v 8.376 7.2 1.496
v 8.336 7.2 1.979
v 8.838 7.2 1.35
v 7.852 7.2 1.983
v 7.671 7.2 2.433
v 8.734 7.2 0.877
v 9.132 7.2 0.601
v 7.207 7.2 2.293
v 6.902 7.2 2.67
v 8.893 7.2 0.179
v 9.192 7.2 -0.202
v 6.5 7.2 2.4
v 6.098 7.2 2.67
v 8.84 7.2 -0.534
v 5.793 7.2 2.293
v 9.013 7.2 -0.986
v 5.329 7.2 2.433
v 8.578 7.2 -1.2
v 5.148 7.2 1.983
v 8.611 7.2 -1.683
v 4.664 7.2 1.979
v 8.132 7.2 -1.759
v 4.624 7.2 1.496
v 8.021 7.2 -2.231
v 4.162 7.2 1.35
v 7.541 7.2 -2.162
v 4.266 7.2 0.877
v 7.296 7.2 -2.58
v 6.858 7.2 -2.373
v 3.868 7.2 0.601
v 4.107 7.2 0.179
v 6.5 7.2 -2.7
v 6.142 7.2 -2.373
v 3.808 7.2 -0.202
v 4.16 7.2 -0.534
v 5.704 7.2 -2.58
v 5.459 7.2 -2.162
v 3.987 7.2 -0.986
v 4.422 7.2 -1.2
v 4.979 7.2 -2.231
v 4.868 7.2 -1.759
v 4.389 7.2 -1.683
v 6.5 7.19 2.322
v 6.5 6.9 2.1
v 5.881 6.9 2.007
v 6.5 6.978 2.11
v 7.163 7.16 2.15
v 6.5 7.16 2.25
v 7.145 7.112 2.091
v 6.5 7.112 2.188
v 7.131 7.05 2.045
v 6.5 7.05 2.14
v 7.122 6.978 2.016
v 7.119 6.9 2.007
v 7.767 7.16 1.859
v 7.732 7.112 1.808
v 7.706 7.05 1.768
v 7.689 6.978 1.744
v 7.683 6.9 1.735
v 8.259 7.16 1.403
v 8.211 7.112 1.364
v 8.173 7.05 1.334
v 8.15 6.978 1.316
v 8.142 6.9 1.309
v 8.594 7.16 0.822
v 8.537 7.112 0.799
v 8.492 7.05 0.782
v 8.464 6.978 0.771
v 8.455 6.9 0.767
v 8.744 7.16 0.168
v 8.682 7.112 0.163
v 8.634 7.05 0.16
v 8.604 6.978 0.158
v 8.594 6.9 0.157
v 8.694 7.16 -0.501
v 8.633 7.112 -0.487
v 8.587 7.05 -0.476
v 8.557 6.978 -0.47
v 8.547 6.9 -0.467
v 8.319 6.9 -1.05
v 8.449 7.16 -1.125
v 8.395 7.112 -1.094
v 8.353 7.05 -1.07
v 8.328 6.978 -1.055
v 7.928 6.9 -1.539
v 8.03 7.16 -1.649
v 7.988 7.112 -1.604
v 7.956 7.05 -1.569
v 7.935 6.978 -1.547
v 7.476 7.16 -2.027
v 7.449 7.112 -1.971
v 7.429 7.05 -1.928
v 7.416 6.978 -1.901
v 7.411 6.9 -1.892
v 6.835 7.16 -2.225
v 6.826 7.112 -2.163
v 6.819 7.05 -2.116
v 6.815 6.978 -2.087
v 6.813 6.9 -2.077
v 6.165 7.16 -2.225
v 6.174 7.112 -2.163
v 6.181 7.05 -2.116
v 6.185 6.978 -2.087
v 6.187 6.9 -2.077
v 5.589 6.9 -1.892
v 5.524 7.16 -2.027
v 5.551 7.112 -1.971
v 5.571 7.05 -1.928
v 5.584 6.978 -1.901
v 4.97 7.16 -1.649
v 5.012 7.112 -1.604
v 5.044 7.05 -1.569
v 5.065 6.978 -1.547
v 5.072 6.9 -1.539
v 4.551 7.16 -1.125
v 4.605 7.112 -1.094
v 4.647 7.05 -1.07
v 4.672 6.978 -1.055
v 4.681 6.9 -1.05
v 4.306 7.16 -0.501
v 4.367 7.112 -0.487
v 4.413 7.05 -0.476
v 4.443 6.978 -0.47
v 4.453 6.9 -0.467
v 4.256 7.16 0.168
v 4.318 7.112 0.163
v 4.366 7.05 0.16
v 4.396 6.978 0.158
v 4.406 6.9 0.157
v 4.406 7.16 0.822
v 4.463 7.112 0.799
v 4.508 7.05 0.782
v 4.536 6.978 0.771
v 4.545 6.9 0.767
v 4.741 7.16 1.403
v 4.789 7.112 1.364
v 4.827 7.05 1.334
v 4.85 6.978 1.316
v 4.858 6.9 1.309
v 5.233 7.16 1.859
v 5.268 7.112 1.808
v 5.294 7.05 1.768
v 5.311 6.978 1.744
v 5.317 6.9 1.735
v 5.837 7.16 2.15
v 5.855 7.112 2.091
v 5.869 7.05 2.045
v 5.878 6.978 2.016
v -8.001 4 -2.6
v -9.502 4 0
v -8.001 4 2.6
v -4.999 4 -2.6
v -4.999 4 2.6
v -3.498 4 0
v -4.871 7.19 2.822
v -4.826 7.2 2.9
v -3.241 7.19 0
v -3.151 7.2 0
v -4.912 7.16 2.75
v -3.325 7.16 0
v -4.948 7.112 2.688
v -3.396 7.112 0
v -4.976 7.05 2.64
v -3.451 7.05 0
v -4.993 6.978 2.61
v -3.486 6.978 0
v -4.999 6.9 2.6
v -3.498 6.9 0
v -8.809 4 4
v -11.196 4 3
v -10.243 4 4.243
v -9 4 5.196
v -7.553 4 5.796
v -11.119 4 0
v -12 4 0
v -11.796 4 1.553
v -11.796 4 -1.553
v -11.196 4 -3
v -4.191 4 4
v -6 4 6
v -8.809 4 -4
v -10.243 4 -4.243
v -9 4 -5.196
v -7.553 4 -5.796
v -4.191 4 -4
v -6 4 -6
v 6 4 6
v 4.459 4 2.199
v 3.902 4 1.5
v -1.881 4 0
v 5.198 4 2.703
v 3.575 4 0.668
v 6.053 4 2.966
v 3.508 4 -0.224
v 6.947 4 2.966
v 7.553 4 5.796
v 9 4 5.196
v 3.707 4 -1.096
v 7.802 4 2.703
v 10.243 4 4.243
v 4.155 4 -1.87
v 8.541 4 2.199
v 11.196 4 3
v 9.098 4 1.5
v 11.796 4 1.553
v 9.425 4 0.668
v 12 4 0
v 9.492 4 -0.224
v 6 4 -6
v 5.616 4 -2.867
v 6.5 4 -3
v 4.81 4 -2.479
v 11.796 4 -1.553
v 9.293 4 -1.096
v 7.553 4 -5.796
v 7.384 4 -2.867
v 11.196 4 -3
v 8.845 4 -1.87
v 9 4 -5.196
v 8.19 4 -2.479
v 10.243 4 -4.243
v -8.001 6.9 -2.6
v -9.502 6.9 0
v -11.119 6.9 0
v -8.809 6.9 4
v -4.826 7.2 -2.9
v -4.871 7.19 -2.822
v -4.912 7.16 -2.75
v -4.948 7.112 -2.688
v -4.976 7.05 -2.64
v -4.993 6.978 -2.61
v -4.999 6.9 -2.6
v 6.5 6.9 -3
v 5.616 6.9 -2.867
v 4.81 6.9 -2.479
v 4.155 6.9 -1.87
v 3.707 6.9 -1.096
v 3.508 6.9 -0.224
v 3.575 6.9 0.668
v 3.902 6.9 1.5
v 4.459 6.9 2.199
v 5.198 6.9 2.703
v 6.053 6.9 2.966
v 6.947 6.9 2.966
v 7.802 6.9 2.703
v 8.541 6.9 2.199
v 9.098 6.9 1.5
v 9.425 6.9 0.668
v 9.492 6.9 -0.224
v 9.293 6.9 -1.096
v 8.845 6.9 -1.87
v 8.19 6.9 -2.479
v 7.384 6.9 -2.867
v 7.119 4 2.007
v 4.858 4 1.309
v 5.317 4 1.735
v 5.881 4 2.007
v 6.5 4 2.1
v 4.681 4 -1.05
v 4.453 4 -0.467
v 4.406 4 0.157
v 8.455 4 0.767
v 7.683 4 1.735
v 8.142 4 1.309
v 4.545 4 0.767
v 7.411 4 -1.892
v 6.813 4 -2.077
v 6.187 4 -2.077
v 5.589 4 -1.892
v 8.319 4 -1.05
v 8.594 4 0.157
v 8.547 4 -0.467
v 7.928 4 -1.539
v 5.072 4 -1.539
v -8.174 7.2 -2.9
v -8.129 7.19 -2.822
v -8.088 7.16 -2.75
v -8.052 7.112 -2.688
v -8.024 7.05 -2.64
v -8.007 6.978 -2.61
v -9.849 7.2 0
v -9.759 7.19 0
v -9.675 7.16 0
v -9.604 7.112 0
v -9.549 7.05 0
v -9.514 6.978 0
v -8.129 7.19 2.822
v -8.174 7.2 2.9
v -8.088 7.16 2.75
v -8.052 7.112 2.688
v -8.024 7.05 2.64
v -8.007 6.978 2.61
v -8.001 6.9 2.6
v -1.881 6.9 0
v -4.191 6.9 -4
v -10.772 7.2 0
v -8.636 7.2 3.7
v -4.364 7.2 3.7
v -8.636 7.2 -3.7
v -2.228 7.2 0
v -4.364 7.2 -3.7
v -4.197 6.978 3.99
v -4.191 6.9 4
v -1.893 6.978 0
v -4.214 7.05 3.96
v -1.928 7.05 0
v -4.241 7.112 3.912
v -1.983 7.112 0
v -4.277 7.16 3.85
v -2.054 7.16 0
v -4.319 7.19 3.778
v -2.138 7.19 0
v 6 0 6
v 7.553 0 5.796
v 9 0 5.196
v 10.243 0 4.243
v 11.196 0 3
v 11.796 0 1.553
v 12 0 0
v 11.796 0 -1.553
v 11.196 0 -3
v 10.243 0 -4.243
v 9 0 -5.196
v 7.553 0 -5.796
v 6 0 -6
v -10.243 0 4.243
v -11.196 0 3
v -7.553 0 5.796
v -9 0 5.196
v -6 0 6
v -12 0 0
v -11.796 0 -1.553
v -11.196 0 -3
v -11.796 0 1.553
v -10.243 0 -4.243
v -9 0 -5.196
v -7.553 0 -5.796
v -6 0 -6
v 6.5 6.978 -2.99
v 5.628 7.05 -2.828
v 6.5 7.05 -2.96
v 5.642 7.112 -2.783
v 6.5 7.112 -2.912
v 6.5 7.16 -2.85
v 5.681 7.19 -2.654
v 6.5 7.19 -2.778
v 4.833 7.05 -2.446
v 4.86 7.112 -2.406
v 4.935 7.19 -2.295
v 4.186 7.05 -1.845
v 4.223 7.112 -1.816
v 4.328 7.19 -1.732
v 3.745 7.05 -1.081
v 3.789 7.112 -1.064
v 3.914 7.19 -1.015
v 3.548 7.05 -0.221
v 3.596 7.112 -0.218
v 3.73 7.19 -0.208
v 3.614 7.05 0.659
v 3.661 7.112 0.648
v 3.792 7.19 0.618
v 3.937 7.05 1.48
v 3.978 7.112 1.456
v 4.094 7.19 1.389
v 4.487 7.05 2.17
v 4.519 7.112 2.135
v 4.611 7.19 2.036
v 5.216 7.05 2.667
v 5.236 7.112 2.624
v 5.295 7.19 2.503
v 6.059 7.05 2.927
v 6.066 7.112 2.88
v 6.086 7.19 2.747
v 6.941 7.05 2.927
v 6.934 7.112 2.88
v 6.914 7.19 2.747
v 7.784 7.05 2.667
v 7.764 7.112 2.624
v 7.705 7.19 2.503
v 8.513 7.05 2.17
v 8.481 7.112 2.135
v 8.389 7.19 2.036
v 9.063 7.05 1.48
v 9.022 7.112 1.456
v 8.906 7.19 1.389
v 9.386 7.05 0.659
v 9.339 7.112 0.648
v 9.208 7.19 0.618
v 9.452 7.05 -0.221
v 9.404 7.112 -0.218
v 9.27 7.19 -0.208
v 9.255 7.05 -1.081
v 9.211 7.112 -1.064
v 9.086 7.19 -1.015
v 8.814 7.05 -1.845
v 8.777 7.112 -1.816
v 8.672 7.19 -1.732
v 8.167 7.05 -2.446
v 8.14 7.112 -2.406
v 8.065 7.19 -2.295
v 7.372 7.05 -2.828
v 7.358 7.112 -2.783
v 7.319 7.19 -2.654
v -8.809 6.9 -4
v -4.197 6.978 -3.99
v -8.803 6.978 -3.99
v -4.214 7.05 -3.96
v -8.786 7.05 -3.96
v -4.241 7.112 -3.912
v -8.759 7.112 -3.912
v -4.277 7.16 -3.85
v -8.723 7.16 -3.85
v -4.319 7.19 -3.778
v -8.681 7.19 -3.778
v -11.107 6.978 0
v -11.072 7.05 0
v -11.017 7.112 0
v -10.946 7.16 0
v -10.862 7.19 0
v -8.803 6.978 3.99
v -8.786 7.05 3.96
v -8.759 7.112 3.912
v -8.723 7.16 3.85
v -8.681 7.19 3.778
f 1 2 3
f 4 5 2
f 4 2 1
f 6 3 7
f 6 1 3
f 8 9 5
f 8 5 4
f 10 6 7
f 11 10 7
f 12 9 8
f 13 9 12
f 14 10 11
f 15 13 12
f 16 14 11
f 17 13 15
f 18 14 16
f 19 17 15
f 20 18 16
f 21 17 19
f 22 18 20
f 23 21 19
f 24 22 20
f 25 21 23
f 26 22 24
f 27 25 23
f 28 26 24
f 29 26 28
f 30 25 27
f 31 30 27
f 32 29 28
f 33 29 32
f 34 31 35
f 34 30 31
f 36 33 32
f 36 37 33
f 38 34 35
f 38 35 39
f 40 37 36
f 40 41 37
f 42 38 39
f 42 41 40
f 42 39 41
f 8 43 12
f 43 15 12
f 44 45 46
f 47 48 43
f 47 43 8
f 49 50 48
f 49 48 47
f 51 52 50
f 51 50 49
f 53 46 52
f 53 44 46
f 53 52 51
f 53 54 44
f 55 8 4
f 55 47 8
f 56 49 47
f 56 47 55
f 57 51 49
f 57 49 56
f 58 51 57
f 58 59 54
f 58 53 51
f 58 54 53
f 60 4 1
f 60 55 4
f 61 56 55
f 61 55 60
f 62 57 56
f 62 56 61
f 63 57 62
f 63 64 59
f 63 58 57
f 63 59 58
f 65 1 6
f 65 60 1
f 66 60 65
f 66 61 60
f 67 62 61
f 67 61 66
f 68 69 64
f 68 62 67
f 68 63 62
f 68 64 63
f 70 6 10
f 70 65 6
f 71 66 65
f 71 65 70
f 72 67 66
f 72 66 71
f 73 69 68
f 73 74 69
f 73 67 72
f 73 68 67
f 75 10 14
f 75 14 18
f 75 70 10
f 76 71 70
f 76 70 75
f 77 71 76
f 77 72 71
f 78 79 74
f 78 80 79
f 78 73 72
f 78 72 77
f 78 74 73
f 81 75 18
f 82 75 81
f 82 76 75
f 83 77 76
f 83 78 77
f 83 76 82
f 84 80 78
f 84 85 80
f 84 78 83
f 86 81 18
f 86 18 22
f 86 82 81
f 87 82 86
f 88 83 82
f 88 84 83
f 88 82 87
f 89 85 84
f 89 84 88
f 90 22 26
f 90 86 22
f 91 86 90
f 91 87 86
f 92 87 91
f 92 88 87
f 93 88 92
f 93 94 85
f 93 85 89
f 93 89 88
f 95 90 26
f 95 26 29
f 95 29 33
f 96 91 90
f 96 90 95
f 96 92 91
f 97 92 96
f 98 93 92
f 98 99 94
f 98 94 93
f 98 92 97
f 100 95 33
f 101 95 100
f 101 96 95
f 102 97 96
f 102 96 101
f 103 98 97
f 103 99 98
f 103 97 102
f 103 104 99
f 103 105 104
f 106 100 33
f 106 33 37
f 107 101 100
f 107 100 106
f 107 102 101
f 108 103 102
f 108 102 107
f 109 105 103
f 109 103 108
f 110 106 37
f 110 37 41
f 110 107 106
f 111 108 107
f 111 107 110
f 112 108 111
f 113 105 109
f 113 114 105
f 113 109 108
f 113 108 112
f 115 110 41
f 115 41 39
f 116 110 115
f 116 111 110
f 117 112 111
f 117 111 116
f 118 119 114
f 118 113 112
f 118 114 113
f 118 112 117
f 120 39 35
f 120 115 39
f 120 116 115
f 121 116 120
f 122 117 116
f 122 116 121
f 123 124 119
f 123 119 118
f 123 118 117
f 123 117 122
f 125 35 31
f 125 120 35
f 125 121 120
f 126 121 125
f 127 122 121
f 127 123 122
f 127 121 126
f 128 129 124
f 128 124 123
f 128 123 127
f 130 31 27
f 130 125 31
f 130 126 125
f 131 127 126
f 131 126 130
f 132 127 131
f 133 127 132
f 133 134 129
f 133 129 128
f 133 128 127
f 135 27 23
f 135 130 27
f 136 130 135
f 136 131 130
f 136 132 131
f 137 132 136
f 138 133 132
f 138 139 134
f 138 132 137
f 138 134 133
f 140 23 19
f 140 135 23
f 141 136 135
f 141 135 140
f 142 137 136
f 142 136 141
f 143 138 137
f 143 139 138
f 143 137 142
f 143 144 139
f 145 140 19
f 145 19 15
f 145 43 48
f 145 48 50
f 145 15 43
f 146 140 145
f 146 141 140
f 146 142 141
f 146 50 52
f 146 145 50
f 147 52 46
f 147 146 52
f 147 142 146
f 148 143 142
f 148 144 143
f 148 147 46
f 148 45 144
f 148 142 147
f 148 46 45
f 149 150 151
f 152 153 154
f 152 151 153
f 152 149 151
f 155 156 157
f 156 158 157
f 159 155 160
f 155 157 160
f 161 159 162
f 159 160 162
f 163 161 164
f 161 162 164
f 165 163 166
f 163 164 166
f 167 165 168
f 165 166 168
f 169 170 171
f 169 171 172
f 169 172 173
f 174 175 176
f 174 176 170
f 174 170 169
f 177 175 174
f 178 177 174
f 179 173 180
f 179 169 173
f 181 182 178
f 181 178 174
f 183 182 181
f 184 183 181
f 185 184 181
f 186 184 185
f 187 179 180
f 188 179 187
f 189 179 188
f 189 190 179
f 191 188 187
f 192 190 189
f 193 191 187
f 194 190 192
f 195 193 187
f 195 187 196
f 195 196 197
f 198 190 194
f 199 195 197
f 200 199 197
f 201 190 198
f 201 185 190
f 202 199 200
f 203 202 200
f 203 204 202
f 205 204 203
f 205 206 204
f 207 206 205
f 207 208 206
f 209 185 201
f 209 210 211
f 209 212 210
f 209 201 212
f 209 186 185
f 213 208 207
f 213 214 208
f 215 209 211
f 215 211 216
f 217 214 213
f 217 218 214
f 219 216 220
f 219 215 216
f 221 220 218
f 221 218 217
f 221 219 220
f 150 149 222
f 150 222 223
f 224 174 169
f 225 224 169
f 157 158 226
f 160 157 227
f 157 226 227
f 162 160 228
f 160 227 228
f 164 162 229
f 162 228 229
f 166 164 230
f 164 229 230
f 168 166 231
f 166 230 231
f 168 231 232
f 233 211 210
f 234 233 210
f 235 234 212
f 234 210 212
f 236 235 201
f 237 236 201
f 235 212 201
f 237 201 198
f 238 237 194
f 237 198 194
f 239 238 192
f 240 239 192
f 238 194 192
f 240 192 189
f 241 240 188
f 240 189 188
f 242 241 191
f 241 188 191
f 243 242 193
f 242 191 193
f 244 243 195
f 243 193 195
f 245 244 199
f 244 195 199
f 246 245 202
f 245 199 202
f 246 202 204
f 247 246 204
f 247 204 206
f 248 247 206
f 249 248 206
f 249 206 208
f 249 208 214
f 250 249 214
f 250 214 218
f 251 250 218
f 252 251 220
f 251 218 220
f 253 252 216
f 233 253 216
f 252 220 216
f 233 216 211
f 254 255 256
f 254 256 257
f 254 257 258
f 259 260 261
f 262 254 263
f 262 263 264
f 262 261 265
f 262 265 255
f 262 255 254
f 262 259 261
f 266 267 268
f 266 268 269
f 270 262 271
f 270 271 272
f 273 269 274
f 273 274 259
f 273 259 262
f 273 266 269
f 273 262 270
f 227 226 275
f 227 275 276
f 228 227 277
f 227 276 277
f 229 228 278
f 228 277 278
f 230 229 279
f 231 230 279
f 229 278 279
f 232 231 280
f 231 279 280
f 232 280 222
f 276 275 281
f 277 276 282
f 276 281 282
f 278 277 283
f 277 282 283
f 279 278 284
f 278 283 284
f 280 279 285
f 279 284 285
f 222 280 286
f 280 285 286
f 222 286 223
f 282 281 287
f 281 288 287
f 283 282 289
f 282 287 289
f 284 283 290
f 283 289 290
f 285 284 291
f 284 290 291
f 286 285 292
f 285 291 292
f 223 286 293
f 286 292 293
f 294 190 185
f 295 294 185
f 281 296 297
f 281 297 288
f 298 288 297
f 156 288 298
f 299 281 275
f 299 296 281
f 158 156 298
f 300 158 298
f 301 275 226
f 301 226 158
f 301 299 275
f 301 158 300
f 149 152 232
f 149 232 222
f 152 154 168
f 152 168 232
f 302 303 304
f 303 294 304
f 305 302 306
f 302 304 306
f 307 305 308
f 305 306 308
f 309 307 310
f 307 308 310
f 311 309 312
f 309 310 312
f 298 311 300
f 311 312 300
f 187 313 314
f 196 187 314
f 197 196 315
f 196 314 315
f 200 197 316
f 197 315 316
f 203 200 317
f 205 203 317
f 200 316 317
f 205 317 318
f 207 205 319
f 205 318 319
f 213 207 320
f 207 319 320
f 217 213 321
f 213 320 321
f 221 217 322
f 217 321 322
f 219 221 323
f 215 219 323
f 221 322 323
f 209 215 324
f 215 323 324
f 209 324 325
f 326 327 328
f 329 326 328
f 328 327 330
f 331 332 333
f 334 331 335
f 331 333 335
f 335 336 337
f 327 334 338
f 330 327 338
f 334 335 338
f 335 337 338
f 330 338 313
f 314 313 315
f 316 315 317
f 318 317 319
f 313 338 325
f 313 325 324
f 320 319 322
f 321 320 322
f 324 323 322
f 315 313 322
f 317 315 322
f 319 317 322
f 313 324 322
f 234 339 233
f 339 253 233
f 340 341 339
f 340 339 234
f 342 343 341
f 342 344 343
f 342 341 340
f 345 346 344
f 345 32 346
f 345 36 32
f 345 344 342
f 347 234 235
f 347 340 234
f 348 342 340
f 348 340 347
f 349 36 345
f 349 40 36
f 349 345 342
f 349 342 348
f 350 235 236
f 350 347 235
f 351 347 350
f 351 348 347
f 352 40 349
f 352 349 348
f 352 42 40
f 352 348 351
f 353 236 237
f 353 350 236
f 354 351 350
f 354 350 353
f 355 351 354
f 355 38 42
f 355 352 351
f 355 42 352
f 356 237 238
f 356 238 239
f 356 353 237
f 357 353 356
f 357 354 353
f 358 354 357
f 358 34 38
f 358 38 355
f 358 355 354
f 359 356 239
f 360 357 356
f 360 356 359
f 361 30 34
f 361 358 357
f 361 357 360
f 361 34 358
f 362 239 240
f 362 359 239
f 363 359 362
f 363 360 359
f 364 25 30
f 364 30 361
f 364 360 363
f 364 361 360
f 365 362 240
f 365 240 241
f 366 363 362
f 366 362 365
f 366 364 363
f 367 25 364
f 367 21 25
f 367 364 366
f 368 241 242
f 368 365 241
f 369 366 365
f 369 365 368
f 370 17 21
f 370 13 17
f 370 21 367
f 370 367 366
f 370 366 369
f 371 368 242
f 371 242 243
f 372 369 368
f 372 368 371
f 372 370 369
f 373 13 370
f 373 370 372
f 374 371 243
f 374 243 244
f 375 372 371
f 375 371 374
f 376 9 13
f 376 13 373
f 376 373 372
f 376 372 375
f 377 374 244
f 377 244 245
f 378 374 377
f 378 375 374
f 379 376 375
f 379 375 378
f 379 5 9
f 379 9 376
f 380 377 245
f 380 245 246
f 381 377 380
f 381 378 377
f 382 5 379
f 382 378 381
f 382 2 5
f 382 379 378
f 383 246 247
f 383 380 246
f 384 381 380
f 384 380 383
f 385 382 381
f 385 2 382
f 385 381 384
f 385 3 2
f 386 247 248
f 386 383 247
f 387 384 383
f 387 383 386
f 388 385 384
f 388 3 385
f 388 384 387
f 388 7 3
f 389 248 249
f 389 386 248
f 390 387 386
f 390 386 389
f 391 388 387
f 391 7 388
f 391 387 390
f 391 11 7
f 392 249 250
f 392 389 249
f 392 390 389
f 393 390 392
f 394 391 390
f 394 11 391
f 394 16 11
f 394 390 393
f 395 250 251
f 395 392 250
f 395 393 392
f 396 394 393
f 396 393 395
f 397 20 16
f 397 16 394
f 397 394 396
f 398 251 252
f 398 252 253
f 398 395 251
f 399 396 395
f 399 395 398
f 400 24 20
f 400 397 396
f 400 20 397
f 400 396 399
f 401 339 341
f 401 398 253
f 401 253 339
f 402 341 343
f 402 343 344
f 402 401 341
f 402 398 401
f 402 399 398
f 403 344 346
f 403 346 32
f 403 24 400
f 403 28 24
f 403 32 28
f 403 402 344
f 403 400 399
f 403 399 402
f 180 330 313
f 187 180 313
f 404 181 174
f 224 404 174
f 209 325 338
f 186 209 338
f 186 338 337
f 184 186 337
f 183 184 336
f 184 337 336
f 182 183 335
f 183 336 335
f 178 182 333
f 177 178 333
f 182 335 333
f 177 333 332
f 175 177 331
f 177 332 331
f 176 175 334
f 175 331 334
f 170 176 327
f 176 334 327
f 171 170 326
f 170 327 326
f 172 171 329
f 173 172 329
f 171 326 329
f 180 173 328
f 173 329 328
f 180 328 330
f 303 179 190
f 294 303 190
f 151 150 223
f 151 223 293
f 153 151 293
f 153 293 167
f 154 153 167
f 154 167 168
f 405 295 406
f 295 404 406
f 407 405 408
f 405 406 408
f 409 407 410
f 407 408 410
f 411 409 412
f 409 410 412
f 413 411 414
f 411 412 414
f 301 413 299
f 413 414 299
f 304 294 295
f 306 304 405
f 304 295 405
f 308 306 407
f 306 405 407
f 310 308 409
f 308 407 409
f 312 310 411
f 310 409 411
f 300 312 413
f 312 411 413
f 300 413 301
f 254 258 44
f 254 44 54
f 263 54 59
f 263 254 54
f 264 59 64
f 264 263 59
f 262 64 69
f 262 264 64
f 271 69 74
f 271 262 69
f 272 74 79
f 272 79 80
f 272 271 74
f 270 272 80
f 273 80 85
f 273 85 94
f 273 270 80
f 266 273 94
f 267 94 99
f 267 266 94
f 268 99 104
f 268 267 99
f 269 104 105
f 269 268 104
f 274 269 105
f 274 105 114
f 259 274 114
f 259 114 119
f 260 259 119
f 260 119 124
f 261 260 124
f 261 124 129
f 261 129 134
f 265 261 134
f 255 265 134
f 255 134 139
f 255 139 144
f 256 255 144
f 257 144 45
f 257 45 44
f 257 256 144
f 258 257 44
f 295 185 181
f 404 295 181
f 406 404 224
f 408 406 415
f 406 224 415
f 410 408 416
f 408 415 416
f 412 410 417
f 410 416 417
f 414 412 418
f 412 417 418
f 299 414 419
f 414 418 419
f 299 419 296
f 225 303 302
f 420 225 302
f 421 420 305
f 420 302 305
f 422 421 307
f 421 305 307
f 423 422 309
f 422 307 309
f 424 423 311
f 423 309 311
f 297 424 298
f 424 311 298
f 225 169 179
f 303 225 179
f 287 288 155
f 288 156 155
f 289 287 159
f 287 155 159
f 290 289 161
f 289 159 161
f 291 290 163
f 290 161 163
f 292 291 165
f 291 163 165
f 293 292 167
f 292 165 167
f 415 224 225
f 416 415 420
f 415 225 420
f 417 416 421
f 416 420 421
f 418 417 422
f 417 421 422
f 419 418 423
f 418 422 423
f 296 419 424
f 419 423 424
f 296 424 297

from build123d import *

# Parameters (mm, degrees)
EXTRUDE_1_DEPTH = 4
SKETCH_2_R      = 3
SKETCH_2_R_2    = 2.1
EXTRUDE_2_DEPTH = 3.2
FILLET_1_R      = 0.3


with BuildPart() as part:
    # Эскиз1 → Бобышка-Вытянуть1 (new body)
    with BuildSketch(Plane(origin=(0, 0, 0), x_dir=(1, 0, 0), z_dir=(0, 1, 0))):
        with BuildLine():
            Line((6, 6), (-6, 6))
            ThreePointArc((-6, 6), (-12, 0), (-6, -6))
            Line((-6, -6), (6, -6))
            ThreePointArc((6, -6), (12, 0), (6, 6))
        make_face()
    extrude(amount=EXTRUDE_1_DEPTH)

    # Эскиз2 → Бобышка-Вытянуть2 (add)
    # profile 1 of 2: a face of its own
    with BuildSketch(Plane(origin=(0, 4, 0), x_dir=(1, 0, 0), z_dir=(0, 1, 0))):
        with Locations(Location((6.5, 0, 0), (0, 0, 90))):
            Circle(SKETCH_2_R)
        with Locations(Location((6.5, 0, 0), (0, 0, 270))):
            Circle(SKETCH_2_R_2, mode=Mode.SUBTRACT)
    # profile 2 of 2: a face of its own
    with BuildSketch(Plane(origin=(0, 4, 0), x_dir=(1, 0, 0), z_dir=(0, 1, 0))):
        Polygon((-1.881197846, 0), (-4.190598923, 4), (-8.809401077, 4), (-11.118802154, 0), (-8.809401077, -4), (-4.190598923, -4), align=None)
        Polygon((-3.4977786, 0), (-4.9988893, 2.6), (-8.0011107, 2.6), (-9.5022214, 0), (-8.0011107, -2.6), (-4.9988893, -2.6), align=None, mode=Mode.SUBTRACT)
    extrude(amount=EXTRUDE_2_DEPTH)

    # Скругление1
    fillet_1_edges = [part.edges().sort_by_distance(p)[0] for p in [
        (6.5, 7.2, 3),
        (6.5, 7.2, -2.1),
        (-3.035898385, 7.2, 2),
        (-3.035898385, 7.2, -2),
        (-6.5, 7.2, -4),
        (-9.964101615, 7.2, -2),
        (-9.964101615, 7.2, 2),
        (-6.5, 7.2, 4),
        (-4.24833395, 7.2, 1.3),
        (-4.24833395, 7.2, -1.3),
        (-6.5, 7.2, -2.6),
        (-8.75166605, 7.2, -1.3),
        (-8.75166605, 7.2, 1.3),
        (-6.5, 7.2, 2.6),
    ]]
    fillet(fillet_1_edges, radius=FILLET_1_R)


solid = part.part
